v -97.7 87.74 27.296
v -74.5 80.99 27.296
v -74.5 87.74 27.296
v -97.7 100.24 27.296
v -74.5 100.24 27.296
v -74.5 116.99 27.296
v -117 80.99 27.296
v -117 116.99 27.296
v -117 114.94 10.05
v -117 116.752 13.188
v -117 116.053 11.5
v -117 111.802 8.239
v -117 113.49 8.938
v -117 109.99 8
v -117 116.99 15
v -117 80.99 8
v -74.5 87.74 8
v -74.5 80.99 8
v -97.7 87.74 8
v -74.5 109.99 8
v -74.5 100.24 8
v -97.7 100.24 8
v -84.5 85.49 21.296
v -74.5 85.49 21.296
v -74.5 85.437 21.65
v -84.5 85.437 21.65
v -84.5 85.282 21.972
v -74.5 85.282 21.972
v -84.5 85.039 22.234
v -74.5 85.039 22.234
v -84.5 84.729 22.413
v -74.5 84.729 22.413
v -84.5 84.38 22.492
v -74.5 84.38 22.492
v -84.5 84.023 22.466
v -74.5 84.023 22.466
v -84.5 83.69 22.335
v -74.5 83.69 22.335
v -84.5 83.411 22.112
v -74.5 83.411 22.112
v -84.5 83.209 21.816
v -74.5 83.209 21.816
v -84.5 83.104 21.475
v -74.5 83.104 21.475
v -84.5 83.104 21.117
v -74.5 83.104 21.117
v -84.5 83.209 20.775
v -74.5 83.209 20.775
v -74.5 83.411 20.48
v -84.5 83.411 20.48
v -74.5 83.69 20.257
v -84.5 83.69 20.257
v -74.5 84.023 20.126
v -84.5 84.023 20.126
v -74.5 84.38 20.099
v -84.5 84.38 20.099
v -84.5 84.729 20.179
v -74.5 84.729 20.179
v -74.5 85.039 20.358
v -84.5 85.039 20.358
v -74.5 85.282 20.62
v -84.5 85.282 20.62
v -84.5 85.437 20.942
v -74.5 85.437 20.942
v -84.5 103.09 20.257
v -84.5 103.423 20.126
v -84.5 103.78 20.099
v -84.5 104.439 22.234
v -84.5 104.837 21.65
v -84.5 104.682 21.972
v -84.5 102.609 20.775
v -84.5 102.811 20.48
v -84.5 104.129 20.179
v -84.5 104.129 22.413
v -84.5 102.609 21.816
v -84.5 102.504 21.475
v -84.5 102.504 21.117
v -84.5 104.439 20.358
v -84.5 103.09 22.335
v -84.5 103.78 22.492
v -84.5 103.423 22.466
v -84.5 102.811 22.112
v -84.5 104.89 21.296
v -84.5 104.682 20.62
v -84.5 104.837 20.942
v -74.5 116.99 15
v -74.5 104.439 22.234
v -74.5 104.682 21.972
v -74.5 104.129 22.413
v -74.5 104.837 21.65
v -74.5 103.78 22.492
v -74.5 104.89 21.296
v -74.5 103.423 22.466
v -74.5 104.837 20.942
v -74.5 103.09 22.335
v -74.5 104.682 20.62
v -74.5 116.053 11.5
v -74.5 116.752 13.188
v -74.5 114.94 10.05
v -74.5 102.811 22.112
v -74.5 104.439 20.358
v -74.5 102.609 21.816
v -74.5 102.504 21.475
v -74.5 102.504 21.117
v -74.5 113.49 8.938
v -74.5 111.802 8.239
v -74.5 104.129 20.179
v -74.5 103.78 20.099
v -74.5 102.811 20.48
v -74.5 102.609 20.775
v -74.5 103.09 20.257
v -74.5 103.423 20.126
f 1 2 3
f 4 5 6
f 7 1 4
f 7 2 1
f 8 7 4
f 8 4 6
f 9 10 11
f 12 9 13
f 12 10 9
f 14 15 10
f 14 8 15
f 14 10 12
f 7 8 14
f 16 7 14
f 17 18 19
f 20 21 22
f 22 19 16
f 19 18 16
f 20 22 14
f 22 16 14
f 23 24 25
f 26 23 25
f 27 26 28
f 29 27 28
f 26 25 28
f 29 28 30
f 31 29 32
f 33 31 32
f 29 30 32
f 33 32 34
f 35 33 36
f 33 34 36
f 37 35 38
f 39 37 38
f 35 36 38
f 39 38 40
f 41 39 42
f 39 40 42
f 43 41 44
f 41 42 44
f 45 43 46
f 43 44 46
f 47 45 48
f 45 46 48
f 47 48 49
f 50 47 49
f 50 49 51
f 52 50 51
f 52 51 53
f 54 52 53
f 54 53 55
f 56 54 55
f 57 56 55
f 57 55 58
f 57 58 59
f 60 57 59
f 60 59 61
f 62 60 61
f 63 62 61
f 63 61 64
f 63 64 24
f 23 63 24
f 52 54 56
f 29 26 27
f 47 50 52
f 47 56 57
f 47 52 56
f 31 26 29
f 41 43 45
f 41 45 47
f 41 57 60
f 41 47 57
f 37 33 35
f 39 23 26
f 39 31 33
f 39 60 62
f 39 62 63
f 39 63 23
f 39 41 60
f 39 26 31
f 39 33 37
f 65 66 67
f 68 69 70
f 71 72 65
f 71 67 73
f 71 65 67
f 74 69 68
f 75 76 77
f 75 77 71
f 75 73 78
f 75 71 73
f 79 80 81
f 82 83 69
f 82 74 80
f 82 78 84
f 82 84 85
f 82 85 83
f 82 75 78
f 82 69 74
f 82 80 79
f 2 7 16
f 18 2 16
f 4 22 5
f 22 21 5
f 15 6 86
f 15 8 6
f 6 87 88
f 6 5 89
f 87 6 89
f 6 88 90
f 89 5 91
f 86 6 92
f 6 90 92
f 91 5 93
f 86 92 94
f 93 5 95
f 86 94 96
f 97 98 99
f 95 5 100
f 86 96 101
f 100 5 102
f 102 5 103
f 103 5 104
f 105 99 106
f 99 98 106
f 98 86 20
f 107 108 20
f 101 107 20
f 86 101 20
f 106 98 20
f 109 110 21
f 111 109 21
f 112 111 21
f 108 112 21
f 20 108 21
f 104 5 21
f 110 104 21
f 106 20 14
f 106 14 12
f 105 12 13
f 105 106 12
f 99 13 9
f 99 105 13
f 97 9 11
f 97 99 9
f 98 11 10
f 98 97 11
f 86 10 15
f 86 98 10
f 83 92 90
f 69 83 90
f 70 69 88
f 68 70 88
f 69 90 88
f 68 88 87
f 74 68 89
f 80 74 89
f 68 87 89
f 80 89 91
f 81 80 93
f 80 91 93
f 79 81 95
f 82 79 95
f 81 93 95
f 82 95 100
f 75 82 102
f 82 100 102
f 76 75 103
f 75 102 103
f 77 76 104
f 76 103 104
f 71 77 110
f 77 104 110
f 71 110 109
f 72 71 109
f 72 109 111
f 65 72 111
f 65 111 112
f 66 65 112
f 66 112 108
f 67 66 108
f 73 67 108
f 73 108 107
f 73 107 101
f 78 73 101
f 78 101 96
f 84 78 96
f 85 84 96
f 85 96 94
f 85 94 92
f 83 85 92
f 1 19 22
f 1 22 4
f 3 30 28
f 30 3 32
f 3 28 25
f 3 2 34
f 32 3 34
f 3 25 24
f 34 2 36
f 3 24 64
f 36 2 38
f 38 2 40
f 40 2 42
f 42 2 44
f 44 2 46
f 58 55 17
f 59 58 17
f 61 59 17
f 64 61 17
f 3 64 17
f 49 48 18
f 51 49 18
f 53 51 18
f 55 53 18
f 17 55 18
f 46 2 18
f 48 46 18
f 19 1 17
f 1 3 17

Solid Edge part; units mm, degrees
sketch "Sketch1" plane through (-117, 0, 0) normal (1, 0, 0) x (0, 1, 0)
  line L0 (80.9905, 27.2958) -> (116.9905, 27.2958)
  line L1 (116.9905, 27.2958) -> (116.9905, 8)
  line L2 (80.9905, 8) -> (116.9905, 8)
  line L3 (80.9905, 27.2958) -> (80.9905, 8)
extrude "Protrusion1" add sketch "Sketch1" along normal blind 42.5
fillet "Round_2" radius 7 1 edges at (-95.75, 116.9905, 8)
sketch "Sketch2" plane through (-74.5, 98.9905, 18.3979) normal (1, 0, 0) x (0, 1, 0)
  line L0 (-11.25, 9.3979) -> (-11.25, -10.3979)
  line L1 (-11.25, -10.3979) -> (1.25, -10.3979)
  line L2 (1.25, -10.3979) -> (1.25, 9.3979)
  line L3 (-11.25, 9.3979) -> (1.25, 9.3979)
extrude "ExtrudedCutout_7" cut sketch "Sketch2" against normal blind 23.2
sketch "Sketch3" plane through (-74.5, 98.9905, 18.3979) normal (1, 0, 0) x (0, 1, 0)
  circle A0 centre (-14.7, 2.8979) radius 1.2
  circle A1 centre (4.7, 2.8979) radius 1.2
extrude "ExtrudedCutout_8" cut sketch "Sketch3" against normal blind 10
